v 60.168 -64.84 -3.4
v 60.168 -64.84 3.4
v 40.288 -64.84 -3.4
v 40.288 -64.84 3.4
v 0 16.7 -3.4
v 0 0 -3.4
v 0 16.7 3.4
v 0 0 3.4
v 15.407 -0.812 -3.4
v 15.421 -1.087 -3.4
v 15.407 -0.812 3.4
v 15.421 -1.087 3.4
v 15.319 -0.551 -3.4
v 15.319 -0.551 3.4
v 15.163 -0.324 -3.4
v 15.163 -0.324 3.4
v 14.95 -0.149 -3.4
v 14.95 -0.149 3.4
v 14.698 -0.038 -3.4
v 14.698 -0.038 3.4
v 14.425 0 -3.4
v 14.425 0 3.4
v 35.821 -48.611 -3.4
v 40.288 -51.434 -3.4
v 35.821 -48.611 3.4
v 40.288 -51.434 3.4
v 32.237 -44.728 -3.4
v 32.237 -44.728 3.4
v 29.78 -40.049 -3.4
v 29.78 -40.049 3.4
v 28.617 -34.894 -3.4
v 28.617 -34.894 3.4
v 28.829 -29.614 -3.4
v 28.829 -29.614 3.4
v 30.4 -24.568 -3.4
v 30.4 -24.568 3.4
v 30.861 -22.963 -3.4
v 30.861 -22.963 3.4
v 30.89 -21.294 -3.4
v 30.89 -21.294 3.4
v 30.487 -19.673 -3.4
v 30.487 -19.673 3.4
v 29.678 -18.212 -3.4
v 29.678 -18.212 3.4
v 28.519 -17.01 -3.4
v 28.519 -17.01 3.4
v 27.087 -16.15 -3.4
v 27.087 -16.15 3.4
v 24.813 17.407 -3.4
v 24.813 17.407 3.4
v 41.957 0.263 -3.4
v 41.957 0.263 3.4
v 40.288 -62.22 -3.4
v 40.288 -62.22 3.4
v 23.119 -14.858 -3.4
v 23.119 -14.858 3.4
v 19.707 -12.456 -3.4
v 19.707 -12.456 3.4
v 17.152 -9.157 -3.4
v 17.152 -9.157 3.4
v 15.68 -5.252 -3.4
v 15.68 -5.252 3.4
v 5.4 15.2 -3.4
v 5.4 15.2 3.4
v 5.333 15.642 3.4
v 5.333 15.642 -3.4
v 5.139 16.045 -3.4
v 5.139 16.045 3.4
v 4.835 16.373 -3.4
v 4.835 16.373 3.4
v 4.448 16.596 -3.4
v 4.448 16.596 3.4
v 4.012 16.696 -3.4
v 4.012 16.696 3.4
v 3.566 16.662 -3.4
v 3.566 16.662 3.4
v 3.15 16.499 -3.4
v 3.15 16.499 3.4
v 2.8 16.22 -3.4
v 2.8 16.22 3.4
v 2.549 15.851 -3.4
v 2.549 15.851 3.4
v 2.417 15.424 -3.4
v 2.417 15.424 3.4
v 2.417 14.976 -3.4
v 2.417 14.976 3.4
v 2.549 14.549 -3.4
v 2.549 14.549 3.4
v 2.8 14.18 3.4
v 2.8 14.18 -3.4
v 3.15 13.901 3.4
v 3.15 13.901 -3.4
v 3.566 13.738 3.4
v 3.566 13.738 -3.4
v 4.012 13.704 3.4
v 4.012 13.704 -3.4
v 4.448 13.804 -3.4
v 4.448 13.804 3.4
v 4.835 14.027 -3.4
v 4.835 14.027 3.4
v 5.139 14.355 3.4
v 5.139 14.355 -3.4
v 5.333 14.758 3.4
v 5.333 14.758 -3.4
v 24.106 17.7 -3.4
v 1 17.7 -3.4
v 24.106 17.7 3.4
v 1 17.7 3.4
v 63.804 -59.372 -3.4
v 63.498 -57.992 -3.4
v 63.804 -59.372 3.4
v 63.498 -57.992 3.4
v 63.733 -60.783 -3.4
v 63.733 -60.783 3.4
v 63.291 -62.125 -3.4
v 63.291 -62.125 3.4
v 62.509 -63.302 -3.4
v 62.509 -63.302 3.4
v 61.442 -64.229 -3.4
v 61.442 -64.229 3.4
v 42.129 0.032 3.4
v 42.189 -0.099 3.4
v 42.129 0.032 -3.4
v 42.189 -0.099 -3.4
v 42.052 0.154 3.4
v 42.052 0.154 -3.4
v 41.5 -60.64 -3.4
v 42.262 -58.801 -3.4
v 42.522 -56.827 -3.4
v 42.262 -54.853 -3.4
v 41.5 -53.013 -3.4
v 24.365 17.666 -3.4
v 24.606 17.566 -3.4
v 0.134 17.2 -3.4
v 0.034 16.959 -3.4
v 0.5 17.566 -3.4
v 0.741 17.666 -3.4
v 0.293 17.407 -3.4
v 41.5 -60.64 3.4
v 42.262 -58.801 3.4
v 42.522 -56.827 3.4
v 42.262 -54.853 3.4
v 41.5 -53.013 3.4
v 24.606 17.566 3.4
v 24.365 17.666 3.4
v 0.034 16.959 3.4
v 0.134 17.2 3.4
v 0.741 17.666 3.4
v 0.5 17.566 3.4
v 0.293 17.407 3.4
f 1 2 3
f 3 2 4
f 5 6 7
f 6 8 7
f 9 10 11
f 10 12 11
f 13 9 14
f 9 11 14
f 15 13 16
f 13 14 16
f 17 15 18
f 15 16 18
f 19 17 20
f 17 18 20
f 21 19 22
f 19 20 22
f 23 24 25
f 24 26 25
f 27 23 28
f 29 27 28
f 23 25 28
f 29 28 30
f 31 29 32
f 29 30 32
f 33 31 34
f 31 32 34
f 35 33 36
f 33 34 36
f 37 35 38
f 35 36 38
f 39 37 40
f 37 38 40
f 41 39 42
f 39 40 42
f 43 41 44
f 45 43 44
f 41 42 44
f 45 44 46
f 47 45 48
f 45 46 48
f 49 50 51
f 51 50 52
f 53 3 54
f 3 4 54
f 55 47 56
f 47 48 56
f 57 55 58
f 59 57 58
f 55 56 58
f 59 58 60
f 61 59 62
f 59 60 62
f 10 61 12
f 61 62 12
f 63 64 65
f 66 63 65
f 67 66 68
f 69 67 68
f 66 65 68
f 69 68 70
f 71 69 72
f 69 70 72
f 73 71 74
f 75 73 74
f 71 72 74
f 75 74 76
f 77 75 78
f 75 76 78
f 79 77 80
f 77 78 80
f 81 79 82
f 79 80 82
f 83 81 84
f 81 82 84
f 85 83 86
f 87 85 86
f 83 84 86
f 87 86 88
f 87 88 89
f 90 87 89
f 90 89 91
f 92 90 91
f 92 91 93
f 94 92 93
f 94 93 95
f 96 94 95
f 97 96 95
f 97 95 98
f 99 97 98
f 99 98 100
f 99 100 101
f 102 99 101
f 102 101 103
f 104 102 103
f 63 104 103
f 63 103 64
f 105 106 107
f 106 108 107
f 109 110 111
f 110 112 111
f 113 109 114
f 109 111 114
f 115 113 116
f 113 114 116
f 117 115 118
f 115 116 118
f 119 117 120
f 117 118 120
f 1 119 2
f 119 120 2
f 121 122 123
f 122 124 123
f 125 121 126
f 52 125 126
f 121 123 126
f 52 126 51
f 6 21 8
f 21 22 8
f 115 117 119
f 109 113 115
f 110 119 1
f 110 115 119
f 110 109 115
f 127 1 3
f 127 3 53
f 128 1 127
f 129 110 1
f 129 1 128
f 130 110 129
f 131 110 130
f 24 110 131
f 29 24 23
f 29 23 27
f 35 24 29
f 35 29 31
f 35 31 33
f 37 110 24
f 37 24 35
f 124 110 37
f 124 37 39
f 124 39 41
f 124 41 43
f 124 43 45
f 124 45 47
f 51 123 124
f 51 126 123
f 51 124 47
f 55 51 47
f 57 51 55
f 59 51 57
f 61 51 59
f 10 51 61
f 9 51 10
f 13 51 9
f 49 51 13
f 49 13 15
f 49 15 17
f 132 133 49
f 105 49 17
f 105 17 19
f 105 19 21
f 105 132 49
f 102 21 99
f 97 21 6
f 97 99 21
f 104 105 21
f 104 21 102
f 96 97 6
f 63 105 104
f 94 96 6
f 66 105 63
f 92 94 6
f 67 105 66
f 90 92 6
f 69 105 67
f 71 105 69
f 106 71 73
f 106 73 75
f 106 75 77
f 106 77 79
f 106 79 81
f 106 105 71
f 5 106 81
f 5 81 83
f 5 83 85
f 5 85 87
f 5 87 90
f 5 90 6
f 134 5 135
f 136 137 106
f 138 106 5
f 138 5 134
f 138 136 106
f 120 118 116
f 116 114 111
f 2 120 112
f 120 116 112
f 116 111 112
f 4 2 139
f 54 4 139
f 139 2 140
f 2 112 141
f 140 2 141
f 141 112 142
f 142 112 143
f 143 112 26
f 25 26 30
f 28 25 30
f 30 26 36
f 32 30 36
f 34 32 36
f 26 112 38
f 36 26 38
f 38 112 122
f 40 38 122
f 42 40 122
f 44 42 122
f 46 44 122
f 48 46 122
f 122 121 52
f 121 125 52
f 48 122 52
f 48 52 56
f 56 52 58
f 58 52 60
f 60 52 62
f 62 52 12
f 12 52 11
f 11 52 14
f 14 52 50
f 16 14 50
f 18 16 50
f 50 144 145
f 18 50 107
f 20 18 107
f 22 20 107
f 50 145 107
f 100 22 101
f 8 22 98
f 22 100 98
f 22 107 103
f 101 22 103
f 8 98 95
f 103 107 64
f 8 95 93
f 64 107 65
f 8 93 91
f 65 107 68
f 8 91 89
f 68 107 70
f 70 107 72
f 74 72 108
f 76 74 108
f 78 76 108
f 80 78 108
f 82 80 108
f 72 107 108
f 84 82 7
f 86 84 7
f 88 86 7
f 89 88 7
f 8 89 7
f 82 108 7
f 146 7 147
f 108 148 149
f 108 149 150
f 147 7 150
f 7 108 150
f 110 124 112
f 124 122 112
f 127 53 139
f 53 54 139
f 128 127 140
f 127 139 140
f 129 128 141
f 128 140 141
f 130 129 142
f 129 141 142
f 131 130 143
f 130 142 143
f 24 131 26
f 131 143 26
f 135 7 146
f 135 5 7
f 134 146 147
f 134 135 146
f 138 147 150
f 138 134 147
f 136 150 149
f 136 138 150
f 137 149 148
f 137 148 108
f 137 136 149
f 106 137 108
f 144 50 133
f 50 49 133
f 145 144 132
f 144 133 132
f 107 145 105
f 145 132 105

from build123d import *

# Parameters (mm, degrees)
SALIENTE_EXTRUIR1_DEPTH = 3.4
REDONDEO1_R             = 1
CROQUIS2_R              = 1.5
CORTAR_EXTRUIR1_DEPTH   = 92.234871739


with BuildPart() as part:
    # Croquis1 → Saliente-Extruir1 (new, symmetric)
    with BuildSketch(Plane.XY):
        with BuildLine():
            Line((0, 0), (0, 17.7))
            Line((0, 17.7), (24.52, 17.7))
            Line((24.52, 17.7), (42.112816716, 0.107183284))
            Line((42.112816716, 0.107183284), (63.497678713, -57.992177964))
            ThreePointArc((63.497678713, -57.992177964), (63.291104637, -62.125108825), (60.168100271, -64.84))
            Line((60.168100271, -64.84), (40.288100271, -64.84))
            Line((40.288100271, -64.84), (40.288100271, -62.22))
            ThreePointArc((40.288100271, -62.22), (42.521984385, -56.826926676), (40.288100271, -51.433853352))
            ThreePointArc((40.288100271, -51.433853352), (29.779800656, -40.049047756), (30.39958398, -24.5682846))
            ThreePointArc((30.39958398, -24.5682846), (30.487083192, -19.672969425), (27.087443921, -16.149587582))
            ThreePointArc((27.087443921, -16.149587582), (17.978818799, -10.462294263), (15.55957188, 0))
            Line((15.55957188, 0), (0, 0))
        make_face()
    extrude(amount=SALIENTE_EXTRUIR1_DEPTH, both=True)

    # Redondeo1
    redondeo1_edges = [part.edges().sort_by_distance(p)[0] for p in [
        (0, 17.7, 0),
        (24.52, 17.7, 0),
        (42.112816716, 0.107183284, 0),
        (15.55957188, 0, 0),
    ]]
    fillet(redondeo1_edges, radius=REDONDEO1_R)

    # Croquis2 → Cortar-Extruir1 (cut, through all)
    with BuildSketch(Plane.XY.offset(3.4)):
        with Locations((3.9, 15.2)):
            Circle(CROQUIS2_R)
    extrude(amount=-CORTAR_EXTRUIR1_DEPTH, mode=Mode.SUBTRACT)


solid = part.part
